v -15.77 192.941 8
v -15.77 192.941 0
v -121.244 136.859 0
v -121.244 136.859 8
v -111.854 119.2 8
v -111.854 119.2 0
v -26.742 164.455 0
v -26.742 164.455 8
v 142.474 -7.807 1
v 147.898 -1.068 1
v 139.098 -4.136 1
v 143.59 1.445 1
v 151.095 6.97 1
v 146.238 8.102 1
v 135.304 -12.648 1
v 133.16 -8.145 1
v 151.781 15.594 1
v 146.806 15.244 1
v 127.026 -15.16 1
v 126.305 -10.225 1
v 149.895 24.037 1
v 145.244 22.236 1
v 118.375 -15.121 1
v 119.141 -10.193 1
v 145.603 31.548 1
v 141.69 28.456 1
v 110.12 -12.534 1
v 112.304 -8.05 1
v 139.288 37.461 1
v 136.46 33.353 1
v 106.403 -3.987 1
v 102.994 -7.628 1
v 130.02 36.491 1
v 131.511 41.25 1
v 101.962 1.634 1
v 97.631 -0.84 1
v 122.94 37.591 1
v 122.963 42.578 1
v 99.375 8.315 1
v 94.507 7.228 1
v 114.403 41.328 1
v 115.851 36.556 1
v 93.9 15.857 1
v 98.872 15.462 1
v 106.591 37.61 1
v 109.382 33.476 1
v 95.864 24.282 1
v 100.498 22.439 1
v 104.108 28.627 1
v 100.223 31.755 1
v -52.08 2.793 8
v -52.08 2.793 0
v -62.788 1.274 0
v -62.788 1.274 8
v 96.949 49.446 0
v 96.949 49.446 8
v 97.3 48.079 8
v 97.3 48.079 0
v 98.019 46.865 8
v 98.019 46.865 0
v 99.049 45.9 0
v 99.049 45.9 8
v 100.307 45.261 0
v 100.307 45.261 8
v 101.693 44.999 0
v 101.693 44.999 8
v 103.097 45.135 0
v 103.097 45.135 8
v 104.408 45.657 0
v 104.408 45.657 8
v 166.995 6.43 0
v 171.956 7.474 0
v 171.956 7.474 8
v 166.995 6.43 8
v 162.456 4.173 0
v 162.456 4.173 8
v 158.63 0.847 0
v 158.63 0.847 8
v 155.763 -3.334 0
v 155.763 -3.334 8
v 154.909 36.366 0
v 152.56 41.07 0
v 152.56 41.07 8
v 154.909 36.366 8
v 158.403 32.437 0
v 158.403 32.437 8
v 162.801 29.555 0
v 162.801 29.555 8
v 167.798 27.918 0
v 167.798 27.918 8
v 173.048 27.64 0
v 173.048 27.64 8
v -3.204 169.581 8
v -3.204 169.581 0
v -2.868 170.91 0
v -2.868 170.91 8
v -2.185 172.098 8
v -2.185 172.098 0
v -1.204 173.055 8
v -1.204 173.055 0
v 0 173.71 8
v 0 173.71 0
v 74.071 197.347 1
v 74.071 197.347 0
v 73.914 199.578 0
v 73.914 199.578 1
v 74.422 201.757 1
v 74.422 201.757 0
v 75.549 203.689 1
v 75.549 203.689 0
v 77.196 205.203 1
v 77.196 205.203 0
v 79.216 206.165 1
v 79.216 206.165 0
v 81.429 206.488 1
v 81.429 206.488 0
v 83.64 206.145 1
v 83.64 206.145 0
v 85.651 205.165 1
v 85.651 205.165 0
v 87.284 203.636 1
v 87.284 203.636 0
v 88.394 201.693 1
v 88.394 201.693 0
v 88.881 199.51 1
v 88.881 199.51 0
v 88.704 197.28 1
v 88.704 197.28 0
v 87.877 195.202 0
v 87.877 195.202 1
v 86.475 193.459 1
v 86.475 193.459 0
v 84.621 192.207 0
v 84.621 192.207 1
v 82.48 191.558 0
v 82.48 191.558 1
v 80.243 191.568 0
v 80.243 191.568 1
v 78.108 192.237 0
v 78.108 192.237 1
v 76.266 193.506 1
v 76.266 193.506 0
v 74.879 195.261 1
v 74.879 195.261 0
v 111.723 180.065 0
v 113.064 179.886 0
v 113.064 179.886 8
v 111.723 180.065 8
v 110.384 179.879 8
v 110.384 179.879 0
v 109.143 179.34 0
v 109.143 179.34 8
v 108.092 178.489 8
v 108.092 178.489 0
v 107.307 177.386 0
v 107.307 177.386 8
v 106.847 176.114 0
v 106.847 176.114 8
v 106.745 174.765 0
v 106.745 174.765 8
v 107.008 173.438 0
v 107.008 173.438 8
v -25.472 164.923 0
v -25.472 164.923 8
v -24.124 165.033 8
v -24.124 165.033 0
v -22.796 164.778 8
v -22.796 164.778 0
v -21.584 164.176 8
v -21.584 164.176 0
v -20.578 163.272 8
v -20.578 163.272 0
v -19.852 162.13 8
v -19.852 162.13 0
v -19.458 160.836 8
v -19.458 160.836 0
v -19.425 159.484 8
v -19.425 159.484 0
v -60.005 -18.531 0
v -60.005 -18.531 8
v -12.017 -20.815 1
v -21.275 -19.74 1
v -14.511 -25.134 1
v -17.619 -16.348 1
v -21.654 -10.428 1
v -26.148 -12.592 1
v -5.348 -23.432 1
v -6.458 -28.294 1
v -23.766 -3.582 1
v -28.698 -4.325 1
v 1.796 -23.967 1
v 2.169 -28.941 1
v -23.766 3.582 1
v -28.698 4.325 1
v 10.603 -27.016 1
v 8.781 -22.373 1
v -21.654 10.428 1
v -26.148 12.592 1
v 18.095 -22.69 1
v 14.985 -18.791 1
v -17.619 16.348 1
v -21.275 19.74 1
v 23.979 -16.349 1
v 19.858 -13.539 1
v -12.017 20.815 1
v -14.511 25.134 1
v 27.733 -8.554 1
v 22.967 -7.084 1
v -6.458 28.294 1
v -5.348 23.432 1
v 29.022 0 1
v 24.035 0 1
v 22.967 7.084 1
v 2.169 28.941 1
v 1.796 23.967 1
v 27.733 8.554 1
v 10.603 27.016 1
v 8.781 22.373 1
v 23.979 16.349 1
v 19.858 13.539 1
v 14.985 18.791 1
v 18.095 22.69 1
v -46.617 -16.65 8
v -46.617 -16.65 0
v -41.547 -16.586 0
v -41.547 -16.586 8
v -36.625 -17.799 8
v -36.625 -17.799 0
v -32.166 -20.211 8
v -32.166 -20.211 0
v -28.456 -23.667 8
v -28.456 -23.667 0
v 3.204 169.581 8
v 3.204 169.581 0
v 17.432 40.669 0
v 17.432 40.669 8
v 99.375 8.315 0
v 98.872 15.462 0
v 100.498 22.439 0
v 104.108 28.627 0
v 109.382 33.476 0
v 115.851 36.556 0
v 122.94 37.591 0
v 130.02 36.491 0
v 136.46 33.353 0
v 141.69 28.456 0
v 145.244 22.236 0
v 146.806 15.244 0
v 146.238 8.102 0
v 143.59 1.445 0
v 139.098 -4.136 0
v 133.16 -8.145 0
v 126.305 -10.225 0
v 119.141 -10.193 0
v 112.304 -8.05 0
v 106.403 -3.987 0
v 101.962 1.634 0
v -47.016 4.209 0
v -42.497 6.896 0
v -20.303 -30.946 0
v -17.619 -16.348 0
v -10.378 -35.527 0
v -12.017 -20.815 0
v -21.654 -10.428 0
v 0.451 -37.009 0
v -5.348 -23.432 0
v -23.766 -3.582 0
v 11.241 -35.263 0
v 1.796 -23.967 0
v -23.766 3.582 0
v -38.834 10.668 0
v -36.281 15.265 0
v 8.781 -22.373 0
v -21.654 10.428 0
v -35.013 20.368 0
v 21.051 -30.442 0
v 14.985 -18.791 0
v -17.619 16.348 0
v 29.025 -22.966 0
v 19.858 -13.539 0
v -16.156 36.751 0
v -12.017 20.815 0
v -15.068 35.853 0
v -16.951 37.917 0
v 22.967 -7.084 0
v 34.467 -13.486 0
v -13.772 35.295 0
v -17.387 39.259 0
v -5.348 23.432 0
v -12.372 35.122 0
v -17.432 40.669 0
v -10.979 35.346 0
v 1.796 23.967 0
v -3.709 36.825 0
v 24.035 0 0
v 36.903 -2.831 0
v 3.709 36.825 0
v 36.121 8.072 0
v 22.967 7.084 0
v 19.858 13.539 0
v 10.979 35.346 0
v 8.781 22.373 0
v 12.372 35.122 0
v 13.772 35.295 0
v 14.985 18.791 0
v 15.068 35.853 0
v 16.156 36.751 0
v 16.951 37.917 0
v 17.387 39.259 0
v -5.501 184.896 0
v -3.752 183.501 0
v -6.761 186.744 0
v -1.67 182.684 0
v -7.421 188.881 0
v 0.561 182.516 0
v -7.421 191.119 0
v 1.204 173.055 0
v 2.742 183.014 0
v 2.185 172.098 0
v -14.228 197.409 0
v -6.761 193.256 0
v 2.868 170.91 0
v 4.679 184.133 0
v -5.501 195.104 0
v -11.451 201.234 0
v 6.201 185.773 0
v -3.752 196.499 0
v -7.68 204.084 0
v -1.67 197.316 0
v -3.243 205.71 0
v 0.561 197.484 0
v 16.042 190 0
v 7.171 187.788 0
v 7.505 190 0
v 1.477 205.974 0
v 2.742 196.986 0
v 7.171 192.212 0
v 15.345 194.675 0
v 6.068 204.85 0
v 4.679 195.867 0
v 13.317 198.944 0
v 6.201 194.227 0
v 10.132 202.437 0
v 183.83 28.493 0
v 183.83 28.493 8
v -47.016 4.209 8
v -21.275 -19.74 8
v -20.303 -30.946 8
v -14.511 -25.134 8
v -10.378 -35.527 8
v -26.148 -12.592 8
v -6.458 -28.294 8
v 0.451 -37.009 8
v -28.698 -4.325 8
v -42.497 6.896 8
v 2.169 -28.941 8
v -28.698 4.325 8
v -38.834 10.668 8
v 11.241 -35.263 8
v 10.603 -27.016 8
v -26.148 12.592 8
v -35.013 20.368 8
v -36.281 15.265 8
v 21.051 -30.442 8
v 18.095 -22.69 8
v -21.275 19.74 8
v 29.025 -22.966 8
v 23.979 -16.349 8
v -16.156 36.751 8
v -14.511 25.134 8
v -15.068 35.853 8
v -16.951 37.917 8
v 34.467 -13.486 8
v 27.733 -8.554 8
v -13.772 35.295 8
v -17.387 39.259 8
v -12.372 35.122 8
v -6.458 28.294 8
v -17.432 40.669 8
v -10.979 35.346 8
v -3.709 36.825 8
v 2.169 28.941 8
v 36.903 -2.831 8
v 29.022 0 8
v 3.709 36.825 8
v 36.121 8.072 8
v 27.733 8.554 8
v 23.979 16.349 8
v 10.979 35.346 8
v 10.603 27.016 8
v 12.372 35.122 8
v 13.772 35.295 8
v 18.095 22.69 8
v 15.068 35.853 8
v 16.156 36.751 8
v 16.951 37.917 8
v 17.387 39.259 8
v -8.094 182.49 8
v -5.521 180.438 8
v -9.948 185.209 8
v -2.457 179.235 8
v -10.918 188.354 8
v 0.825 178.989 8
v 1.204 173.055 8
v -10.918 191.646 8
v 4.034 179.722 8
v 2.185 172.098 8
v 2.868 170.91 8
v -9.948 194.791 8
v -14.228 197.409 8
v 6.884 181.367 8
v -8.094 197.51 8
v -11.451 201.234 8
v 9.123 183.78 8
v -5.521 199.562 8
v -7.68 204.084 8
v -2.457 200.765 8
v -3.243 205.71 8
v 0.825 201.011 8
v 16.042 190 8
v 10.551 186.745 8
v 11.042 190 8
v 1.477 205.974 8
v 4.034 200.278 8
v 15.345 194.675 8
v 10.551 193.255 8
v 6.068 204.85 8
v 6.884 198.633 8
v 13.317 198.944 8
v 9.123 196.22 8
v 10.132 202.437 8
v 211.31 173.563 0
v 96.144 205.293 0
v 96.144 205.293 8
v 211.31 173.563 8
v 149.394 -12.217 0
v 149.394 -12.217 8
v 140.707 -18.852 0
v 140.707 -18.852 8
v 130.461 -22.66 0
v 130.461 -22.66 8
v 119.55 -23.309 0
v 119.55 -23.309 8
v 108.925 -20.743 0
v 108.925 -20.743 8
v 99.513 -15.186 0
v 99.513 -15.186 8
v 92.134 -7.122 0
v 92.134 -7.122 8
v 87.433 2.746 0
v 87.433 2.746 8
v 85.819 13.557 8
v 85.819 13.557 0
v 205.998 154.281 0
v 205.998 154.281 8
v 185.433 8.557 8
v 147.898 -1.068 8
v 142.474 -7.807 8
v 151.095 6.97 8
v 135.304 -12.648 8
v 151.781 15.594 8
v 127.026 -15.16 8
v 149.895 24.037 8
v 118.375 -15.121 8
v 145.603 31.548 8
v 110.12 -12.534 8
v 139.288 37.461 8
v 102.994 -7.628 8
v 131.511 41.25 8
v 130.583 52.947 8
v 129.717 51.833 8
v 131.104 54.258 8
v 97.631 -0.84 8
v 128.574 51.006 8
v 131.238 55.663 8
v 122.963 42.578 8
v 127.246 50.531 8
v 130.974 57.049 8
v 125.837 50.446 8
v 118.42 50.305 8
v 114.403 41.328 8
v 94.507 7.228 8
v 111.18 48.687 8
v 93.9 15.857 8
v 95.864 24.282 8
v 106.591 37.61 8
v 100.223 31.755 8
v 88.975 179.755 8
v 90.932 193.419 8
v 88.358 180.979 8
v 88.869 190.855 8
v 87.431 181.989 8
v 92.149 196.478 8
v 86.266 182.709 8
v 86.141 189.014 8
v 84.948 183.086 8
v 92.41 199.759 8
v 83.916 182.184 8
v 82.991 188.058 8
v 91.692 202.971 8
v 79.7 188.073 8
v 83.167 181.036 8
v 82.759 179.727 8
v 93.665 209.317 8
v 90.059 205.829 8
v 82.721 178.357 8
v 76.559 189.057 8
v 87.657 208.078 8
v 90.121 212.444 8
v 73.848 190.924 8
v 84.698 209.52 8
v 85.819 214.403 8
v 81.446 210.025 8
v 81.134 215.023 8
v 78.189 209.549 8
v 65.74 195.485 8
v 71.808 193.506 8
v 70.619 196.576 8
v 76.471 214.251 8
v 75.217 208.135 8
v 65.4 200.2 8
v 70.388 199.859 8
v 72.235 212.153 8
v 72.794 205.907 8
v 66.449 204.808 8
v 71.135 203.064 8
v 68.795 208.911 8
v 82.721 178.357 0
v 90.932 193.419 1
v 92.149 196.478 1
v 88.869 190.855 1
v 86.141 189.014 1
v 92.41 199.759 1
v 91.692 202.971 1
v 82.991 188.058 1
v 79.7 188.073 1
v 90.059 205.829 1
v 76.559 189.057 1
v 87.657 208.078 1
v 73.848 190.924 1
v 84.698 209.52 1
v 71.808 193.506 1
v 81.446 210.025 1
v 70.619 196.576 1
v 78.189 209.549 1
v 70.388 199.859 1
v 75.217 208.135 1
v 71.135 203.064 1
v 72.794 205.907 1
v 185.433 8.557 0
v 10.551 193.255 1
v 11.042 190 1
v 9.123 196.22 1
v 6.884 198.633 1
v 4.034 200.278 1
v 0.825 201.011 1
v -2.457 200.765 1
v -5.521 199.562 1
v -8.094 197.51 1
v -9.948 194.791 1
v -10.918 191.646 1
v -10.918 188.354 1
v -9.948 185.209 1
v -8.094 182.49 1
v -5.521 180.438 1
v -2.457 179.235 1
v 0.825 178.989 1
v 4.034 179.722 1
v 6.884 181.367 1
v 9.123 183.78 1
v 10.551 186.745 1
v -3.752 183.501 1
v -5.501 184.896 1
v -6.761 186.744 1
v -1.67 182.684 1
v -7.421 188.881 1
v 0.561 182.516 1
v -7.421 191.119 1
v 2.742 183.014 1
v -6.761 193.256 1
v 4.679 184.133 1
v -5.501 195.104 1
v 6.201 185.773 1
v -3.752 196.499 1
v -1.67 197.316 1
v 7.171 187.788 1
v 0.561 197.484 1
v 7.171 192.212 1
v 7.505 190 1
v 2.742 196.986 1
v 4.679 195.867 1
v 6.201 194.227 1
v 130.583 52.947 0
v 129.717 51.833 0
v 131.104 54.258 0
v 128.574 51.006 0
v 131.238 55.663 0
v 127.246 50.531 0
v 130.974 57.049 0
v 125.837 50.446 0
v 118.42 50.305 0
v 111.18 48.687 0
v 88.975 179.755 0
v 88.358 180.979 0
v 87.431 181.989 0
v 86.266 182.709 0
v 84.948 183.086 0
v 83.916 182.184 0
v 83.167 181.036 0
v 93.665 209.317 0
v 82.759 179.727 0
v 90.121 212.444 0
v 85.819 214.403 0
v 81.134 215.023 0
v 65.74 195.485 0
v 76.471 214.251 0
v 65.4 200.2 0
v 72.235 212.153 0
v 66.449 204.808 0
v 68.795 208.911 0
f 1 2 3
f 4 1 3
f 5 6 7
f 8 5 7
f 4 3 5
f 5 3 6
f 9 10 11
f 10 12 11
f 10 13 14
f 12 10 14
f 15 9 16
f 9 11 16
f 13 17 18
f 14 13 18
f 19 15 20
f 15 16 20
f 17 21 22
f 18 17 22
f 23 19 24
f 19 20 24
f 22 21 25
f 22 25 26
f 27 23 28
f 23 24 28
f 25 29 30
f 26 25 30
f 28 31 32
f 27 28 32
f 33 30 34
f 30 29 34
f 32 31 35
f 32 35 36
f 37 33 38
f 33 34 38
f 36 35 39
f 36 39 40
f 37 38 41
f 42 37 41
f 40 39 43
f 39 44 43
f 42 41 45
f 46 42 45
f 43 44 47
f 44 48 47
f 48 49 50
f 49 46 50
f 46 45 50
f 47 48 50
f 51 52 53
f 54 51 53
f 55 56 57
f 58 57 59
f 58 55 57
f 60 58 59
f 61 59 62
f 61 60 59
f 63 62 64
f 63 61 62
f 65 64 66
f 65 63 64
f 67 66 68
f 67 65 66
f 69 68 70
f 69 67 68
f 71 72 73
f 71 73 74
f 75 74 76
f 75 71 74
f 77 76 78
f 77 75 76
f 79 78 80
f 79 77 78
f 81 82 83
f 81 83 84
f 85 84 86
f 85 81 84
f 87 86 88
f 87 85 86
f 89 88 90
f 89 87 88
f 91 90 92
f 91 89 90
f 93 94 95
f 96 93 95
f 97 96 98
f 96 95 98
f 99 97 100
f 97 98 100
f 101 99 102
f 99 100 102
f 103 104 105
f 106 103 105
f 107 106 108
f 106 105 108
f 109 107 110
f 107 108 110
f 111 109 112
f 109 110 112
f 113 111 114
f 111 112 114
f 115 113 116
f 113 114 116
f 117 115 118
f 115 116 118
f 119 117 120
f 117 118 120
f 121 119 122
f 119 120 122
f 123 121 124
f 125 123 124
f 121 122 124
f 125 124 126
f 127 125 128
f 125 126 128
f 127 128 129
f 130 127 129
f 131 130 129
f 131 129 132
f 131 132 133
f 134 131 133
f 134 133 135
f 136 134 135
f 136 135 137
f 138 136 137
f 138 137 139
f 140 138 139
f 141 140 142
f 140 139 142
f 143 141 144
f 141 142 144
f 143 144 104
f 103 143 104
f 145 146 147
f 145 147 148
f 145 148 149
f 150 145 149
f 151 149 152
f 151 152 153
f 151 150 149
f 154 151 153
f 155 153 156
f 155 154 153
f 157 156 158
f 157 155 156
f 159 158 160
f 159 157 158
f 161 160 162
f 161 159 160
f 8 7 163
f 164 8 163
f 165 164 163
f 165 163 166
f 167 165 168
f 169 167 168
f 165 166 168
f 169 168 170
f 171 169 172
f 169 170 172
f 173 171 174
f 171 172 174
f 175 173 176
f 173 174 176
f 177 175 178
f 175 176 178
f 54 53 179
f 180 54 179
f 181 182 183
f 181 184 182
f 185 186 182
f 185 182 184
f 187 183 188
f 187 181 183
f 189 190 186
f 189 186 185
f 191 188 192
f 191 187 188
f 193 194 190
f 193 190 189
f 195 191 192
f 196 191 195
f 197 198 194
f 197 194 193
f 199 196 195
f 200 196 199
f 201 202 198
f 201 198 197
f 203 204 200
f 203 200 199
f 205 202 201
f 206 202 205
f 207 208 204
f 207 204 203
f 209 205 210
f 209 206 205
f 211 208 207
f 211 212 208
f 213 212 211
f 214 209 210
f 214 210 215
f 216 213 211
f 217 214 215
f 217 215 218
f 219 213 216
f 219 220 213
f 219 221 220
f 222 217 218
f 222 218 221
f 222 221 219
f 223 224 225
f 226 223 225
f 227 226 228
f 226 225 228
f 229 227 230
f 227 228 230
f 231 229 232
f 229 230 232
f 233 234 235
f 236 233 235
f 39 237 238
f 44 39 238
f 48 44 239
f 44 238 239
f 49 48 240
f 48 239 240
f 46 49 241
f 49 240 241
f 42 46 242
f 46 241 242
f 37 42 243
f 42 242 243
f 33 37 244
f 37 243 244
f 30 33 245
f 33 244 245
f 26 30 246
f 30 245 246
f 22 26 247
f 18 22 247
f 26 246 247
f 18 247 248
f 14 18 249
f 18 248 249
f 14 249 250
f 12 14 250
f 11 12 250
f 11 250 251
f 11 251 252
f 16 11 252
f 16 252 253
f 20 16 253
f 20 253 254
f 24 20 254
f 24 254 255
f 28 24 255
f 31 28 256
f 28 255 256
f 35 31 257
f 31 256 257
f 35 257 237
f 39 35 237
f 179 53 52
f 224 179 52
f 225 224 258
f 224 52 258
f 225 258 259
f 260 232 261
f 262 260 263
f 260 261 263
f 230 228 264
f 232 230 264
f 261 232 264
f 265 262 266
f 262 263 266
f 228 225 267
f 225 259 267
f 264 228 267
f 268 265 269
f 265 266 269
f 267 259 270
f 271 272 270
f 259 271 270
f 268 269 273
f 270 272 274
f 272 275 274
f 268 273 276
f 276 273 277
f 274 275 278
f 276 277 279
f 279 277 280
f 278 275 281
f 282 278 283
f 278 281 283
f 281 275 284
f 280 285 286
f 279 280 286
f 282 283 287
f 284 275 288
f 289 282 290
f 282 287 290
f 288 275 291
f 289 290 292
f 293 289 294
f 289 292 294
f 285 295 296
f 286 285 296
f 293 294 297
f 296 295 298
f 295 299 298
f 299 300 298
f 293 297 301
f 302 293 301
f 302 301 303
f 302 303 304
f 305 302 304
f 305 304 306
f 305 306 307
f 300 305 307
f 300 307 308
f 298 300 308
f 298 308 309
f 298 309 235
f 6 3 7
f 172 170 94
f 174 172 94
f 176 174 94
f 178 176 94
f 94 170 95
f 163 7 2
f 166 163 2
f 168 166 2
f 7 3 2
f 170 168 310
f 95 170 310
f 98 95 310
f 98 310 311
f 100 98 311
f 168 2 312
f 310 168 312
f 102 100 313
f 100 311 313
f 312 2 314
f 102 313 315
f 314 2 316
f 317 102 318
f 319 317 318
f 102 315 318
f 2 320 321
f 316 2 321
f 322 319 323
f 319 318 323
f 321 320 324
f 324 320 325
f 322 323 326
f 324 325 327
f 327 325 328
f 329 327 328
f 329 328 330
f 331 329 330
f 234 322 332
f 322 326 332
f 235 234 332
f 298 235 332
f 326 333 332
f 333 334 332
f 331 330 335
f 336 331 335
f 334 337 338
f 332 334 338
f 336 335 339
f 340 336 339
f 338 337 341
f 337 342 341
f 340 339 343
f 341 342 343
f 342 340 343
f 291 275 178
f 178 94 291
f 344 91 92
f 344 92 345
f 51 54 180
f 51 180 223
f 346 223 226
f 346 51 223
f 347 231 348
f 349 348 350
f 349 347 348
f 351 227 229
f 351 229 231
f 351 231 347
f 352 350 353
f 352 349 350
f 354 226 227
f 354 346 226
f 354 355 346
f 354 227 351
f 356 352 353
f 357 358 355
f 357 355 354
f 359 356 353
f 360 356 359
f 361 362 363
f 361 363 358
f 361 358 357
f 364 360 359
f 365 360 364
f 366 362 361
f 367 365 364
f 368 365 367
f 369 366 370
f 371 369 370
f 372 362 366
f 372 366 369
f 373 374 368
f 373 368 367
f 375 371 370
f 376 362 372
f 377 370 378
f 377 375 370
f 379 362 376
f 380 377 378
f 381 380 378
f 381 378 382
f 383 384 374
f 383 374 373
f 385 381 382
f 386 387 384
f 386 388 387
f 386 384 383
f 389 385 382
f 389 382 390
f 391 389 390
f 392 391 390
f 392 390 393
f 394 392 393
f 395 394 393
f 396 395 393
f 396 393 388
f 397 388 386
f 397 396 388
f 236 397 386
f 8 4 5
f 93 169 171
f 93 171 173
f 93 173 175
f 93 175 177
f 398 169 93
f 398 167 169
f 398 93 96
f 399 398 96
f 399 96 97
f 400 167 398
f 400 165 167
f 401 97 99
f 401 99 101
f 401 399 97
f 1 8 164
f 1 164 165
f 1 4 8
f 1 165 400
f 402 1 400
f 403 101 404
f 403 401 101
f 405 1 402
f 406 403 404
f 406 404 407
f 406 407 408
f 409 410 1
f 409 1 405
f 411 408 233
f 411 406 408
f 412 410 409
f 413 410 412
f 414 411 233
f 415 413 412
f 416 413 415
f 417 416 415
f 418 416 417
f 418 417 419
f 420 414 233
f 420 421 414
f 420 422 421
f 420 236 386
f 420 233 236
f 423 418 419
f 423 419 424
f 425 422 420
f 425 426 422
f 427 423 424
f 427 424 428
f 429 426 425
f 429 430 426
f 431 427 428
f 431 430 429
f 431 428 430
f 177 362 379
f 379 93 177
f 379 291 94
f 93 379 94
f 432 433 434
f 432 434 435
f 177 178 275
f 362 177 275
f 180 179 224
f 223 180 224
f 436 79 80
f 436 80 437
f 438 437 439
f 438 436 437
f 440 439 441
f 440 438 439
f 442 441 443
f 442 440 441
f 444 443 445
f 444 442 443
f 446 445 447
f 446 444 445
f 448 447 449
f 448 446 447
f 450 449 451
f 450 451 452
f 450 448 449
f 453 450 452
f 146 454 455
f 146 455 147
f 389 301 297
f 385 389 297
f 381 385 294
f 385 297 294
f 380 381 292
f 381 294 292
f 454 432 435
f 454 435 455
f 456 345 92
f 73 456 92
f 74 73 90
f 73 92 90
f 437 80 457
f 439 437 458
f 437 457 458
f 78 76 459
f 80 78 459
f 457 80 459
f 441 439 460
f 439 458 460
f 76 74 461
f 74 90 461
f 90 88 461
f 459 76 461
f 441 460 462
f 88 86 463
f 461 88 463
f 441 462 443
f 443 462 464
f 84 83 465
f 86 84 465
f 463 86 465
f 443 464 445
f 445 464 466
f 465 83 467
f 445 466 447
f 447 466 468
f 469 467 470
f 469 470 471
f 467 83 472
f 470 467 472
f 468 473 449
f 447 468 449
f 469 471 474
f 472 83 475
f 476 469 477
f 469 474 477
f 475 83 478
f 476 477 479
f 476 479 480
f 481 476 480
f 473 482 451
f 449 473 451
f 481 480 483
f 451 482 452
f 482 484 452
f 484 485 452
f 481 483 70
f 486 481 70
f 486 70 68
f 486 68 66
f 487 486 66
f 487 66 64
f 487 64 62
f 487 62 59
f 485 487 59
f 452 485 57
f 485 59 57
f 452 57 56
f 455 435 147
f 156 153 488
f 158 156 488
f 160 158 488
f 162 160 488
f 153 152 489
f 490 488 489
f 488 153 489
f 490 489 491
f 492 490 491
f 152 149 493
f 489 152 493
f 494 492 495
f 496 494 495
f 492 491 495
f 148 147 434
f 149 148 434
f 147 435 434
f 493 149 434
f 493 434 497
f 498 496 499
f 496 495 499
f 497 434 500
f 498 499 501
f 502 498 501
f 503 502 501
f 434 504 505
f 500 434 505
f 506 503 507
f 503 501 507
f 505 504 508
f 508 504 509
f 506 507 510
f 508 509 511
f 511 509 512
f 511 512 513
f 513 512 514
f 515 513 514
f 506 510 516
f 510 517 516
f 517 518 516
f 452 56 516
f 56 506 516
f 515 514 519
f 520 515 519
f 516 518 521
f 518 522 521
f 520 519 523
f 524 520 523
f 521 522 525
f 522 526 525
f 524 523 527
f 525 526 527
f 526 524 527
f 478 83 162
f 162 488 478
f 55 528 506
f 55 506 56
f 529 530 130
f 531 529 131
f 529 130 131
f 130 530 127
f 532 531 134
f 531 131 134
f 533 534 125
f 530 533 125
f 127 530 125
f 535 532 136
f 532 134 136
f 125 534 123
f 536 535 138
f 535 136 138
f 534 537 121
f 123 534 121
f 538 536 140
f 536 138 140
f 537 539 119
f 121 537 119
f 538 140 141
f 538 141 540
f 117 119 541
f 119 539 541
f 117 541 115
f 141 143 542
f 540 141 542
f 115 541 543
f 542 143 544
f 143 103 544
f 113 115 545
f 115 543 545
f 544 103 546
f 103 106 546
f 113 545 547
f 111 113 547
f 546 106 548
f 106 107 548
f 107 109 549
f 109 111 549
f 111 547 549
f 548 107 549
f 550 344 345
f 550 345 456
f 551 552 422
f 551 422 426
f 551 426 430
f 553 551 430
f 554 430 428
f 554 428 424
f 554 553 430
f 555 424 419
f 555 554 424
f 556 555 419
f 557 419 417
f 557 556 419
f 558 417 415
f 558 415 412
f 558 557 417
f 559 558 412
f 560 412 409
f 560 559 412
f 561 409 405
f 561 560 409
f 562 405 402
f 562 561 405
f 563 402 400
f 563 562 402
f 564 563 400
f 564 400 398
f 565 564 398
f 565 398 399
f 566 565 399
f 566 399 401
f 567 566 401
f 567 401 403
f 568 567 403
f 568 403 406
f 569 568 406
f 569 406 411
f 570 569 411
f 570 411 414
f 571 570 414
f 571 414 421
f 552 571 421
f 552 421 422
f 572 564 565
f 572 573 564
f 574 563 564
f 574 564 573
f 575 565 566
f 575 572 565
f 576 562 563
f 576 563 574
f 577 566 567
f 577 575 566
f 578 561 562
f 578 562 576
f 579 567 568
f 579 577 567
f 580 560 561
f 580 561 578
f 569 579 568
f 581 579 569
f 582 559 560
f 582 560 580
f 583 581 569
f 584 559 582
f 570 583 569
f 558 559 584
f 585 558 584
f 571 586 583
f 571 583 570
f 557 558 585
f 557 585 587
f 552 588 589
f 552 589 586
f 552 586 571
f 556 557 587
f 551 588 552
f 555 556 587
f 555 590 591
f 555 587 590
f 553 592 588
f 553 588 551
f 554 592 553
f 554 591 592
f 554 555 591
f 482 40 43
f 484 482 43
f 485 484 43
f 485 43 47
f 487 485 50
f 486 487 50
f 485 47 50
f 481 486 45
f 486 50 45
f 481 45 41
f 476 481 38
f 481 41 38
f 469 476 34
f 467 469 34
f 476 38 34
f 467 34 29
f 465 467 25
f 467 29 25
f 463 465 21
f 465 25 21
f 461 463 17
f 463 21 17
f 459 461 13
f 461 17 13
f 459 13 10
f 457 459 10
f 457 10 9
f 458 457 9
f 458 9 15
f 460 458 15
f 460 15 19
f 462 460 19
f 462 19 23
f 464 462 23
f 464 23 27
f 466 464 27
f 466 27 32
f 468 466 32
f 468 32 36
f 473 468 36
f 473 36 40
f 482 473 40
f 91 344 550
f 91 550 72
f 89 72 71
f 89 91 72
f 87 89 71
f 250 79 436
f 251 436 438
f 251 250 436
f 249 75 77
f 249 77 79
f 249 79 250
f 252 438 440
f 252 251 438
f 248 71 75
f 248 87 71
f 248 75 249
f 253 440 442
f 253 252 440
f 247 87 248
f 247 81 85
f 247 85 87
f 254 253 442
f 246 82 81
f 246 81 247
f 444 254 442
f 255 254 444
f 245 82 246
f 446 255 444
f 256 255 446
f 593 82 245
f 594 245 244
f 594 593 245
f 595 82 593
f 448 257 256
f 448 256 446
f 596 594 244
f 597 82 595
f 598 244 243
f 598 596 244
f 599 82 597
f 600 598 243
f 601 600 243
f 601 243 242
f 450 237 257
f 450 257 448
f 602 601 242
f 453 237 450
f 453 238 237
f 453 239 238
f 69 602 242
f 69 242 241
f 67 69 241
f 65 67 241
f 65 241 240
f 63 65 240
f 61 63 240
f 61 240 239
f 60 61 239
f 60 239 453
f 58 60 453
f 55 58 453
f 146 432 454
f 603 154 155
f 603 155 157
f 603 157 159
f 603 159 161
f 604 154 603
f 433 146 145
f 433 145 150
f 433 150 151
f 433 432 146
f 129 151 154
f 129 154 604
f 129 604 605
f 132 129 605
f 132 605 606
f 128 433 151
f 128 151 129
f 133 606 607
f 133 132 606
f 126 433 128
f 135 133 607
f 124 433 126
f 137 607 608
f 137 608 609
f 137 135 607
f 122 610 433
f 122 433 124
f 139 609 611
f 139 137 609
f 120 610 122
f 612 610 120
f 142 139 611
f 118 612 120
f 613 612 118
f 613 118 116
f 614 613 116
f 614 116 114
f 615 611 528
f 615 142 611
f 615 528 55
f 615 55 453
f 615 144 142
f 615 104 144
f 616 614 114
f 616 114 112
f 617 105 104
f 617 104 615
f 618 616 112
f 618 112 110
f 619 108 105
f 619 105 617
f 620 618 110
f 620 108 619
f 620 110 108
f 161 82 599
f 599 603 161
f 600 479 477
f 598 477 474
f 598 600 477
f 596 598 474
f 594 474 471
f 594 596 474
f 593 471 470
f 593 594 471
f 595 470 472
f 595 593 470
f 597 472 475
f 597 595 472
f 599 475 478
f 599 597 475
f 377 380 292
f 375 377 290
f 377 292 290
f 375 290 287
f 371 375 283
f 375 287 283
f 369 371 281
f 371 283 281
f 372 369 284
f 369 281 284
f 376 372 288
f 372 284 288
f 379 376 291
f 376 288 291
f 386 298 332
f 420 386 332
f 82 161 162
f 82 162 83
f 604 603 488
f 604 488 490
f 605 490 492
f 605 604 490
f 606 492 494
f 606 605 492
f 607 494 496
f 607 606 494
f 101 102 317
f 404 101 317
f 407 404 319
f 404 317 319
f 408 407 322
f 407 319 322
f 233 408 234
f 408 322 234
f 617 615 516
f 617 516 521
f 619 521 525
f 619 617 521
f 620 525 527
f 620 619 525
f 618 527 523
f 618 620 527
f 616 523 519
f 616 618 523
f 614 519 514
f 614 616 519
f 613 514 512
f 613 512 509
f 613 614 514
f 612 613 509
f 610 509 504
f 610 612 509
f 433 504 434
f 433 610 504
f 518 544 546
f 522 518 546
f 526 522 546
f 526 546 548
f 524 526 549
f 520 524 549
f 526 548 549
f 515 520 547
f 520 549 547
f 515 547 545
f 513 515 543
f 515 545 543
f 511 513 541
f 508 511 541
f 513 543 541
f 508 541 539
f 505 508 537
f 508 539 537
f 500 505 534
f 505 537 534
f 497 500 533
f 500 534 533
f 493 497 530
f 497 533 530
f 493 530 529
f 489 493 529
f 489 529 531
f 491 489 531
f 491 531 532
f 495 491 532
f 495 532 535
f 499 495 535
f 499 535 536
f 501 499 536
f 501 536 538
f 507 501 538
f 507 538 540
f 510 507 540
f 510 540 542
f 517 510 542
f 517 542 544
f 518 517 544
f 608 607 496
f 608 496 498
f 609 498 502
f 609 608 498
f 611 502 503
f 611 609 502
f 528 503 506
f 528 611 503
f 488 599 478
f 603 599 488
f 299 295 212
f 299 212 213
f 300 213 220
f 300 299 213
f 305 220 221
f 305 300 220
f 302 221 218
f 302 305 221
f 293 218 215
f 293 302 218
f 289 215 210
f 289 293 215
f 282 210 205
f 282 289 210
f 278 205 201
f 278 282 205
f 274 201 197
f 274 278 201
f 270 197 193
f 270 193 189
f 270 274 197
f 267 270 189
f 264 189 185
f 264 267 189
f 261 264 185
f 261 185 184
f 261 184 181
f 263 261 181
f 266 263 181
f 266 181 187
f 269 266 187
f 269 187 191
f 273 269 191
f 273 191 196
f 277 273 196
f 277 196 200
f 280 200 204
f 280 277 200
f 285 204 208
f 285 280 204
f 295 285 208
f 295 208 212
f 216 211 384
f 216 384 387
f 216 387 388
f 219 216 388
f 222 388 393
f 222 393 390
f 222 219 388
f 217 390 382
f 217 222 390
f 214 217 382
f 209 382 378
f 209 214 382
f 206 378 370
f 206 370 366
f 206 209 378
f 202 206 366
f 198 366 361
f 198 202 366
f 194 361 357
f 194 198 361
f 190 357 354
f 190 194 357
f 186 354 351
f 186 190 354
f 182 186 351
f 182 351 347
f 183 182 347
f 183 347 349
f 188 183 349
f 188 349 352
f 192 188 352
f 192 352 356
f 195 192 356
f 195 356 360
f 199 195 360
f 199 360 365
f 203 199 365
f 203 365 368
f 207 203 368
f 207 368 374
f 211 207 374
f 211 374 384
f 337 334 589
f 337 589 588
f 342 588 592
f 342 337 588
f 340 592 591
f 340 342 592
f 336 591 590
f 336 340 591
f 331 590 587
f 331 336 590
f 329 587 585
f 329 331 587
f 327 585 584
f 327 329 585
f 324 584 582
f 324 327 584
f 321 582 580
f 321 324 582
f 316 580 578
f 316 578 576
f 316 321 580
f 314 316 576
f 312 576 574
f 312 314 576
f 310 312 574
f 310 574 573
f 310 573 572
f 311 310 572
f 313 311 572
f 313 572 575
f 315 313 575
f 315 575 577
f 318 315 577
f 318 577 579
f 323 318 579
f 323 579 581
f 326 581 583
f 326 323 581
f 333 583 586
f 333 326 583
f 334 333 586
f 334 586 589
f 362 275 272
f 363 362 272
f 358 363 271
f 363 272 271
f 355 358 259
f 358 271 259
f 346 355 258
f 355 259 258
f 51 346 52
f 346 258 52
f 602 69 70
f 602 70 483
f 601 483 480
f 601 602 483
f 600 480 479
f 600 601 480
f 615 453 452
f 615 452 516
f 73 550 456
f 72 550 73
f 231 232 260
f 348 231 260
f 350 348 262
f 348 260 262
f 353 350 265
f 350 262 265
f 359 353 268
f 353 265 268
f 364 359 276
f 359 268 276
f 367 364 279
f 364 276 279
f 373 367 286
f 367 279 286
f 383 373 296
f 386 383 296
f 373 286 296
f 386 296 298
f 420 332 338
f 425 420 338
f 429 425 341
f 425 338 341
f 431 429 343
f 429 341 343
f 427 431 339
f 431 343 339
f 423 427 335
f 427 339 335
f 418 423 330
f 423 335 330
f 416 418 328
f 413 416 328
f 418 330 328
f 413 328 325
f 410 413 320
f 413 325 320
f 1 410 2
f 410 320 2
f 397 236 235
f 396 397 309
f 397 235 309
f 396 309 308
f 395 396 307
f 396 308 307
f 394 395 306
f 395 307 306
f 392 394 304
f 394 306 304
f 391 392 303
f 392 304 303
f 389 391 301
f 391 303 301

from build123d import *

# Parameters (mm, degrees)
F0_R     = 29.021942
F0_R_2   = 11.041634
F1_DEPTH = 8
F0_R_3   = 7.504584
F2_DEPTH = 1
F0_R_4   = 24.034592
F3_DEPTH = 1


with BuildPart() as f1:
    # F0 (on Top) → F1 (new body)
    with BuildSketch(Plane.XY):
        with BuildLine():
            ThreePointArc((-46.616685, -16.649824), (-36.62508, -17.799283), (-28.456296, -23.666513))
            ThreePointArc((-28.456296, -23.666513), (16.325204, -33.216748), (36.120837, 8.071539))
            Line((36.120837, 8.071539), (16.041634, 190))
            ThreePointArc((16.041634, 190), (1.47665, 205.973525), (-15.769779, 192.94076))
            Line((-15.769779, 192.94076), (-121.243798, 136.85923))
            Line((-121.243798, 136.85923), (-111.854367, 119.200278))
            Line((-111.854367, 119.200278), (-26.741749, 164.455459))
            ThreePointArc((-26.741749, 164.455459), (-21.584217, 164.176289), (-19.425487, 159.483958))
            Line((-19.425487, 159.483958), (-35.013384, 20.367721))
            ThreePointArc((-35.013384, 20.367721), (-40.540972, 8.661575), (-52.079958, 2.793024))
            Line((-52.079958, 2.793024), (-62.788351, 1.273948))
            Line((-62.788351, 1.273948), (-60.004889, -18.531413))
            Line((-60.004889, -18.531413), (-46.616685, -16.649824))
        make_face()
        Circle(F0_R, mode=Mode.SUBTRACT)
        with BuildLine():
            Line((-17.431985, 40.66928), (-3.204159, 169.581091))
            ThreePointArc((-3.204159, 169.581091), (-2.1846, 172.097773), (0, 173.710444))
            ThreePointArc((0, 173.710444), (2.1846, 172.097773), (3.204159, 169.581091))
            Line((3.204159, 169.581091), (17.431985, 40.66928))
            ThreePointArc((17.431985, 40.66928), (15.643985, 36.263825), (10.978984, 35.345814))
            ThreePointArc((10.978984, 35.345814), (0, 37.011682), (-10.978984, 35.345814))
            ThreePointArc((-10.978984, 35.345814), (-15.643985, 36.263825), (-17.431985, 40.66928))
        make_face(mode=Mode.SUBTRACT)
        with Locations((0, 190)):
            Circle(F0_R_2, mode=Mode.SUBTRACT)
    extrude(amount=F1_DEPTH)

    # F0 (on Top) → F2 (join)
    with BuildSketch(Plane.XY):
        with Locations((0, 190)):
            Circle(F0_R_2)
        with Locations((0, 190)):
            Circle(F0_R_3, mode=Mode.SUBTRACT)
    extrude(amount=F2_DEPTH)

    # F0 (on Top) → F3 (join)
    with BuildSketch(Plane.XY):
        Circle(F0_R)
        Circle(F0_R_4, mode=Mode.SUBTRACT)
    extrude(amount=F3_DEPTH)


with BuildPart() as f5_1:
    # F5: instance of F1
    add(f1.part.mirror(Plane(origin=(50.930347, 101.778333, 4), x_dir=(-0.109703, 0.993964, 0), z_dir=(0.993964, 0.109703, 0))))


solid = Compound([f1.part, f5_1.part])
